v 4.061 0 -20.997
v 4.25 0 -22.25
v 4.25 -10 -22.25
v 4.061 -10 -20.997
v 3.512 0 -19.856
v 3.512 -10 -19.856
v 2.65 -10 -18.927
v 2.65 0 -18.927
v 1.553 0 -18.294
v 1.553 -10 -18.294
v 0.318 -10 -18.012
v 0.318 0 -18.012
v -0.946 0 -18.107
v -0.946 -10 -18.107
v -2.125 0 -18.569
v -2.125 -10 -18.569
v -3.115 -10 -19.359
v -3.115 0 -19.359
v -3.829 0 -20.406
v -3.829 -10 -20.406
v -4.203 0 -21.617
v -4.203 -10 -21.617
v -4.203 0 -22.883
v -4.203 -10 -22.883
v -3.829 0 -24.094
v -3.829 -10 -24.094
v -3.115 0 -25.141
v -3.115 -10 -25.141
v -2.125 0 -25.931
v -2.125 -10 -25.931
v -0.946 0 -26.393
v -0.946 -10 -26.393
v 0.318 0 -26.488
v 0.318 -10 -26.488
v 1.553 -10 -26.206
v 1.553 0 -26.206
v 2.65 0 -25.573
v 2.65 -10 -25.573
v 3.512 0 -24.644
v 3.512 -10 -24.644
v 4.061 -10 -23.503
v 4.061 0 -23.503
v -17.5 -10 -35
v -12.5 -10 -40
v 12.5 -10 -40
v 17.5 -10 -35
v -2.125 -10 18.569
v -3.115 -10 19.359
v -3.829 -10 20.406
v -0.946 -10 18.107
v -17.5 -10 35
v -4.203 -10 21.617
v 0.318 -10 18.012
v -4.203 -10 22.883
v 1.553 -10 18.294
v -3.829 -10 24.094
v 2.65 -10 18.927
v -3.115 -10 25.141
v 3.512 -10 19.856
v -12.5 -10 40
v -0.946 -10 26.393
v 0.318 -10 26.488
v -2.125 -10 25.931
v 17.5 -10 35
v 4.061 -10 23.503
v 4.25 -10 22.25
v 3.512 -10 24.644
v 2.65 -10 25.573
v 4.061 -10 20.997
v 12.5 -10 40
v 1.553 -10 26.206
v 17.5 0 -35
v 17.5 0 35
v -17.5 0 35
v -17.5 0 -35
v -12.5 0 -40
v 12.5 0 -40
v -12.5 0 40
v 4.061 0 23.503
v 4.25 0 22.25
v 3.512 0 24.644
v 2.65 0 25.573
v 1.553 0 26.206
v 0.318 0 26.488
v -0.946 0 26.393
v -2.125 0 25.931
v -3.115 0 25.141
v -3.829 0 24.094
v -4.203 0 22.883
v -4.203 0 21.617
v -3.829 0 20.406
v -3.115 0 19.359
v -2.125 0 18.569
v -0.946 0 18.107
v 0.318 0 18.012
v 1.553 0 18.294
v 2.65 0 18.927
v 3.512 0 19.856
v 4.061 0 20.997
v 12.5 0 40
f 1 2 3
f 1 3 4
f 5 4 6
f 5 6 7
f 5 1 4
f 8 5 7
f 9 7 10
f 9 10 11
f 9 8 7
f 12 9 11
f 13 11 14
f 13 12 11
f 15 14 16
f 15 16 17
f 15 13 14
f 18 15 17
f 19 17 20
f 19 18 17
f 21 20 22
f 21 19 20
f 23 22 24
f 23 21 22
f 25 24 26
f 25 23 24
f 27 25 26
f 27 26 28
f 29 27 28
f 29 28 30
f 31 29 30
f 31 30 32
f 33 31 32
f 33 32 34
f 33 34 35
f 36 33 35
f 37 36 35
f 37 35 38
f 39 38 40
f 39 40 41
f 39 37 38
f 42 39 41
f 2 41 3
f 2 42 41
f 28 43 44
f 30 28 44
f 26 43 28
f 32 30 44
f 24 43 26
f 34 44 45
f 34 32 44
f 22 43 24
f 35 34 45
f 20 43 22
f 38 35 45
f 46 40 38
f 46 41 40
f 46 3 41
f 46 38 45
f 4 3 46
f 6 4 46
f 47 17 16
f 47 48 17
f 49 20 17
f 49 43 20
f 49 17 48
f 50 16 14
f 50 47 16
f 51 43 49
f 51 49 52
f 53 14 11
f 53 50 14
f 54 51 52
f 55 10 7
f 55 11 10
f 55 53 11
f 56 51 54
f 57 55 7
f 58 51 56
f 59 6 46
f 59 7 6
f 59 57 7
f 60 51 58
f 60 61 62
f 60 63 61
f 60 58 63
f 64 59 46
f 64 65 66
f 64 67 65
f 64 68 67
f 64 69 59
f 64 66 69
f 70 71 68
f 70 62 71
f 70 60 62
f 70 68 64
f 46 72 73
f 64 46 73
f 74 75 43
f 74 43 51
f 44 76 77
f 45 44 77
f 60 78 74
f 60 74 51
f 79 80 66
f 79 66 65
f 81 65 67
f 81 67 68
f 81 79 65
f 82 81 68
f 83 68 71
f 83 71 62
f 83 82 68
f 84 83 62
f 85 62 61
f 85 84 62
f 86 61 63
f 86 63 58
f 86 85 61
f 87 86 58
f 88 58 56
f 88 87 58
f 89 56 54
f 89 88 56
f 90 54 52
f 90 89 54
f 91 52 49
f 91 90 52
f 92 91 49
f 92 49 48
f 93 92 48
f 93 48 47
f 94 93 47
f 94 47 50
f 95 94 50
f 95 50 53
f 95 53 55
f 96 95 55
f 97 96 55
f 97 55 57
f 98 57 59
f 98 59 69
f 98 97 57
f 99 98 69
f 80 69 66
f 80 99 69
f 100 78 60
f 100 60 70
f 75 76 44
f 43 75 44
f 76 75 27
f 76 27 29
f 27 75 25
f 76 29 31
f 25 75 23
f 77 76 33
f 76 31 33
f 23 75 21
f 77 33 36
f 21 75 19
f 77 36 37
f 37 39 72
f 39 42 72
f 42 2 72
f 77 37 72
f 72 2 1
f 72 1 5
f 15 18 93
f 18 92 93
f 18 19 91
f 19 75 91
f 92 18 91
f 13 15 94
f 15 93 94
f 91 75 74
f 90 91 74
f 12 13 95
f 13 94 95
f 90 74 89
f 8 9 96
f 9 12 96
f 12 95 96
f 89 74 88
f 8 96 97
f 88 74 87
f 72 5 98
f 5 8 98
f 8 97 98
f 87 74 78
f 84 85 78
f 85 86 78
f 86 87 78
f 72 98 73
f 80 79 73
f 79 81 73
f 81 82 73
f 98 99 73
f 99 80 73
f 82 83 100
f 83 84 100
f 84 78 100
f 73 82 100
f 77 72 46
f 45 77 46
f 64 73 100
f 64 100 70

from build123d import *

# Parameters (mm, degrees)
F0_W     = 35
F0_H     = 80
F0_R     = 4.25
F1_DEPTH = 10
F2_SIZE  = 5


with BuildPart() as f1:
    # F0 (on Front) → F1 (new body)
    with BuildSketch(Plane.XZ):
        Rectangle(F0_W, F0_H)
        with Locations((0, -22.25)):
            Circle(F0_R, mode=Mode.SUBTRACT)
        with Locations((0, 22.25)):
            Circle(F0_R, mode=Mode.SUBTRACT)
    extrude(amount=F1_DEPTH)

    # F2
    f2_edges = [f1.edges().sort_by_distance(p)[0] for p in [
        (-17.5, -5, 40),
        (17.5, -5, 40),
        (-17.5, -5, -40),
        (17.5, -5, -40),
    ]]
    chamfer(f2_edges, length=F2_SIZE)


solid = f1.part
